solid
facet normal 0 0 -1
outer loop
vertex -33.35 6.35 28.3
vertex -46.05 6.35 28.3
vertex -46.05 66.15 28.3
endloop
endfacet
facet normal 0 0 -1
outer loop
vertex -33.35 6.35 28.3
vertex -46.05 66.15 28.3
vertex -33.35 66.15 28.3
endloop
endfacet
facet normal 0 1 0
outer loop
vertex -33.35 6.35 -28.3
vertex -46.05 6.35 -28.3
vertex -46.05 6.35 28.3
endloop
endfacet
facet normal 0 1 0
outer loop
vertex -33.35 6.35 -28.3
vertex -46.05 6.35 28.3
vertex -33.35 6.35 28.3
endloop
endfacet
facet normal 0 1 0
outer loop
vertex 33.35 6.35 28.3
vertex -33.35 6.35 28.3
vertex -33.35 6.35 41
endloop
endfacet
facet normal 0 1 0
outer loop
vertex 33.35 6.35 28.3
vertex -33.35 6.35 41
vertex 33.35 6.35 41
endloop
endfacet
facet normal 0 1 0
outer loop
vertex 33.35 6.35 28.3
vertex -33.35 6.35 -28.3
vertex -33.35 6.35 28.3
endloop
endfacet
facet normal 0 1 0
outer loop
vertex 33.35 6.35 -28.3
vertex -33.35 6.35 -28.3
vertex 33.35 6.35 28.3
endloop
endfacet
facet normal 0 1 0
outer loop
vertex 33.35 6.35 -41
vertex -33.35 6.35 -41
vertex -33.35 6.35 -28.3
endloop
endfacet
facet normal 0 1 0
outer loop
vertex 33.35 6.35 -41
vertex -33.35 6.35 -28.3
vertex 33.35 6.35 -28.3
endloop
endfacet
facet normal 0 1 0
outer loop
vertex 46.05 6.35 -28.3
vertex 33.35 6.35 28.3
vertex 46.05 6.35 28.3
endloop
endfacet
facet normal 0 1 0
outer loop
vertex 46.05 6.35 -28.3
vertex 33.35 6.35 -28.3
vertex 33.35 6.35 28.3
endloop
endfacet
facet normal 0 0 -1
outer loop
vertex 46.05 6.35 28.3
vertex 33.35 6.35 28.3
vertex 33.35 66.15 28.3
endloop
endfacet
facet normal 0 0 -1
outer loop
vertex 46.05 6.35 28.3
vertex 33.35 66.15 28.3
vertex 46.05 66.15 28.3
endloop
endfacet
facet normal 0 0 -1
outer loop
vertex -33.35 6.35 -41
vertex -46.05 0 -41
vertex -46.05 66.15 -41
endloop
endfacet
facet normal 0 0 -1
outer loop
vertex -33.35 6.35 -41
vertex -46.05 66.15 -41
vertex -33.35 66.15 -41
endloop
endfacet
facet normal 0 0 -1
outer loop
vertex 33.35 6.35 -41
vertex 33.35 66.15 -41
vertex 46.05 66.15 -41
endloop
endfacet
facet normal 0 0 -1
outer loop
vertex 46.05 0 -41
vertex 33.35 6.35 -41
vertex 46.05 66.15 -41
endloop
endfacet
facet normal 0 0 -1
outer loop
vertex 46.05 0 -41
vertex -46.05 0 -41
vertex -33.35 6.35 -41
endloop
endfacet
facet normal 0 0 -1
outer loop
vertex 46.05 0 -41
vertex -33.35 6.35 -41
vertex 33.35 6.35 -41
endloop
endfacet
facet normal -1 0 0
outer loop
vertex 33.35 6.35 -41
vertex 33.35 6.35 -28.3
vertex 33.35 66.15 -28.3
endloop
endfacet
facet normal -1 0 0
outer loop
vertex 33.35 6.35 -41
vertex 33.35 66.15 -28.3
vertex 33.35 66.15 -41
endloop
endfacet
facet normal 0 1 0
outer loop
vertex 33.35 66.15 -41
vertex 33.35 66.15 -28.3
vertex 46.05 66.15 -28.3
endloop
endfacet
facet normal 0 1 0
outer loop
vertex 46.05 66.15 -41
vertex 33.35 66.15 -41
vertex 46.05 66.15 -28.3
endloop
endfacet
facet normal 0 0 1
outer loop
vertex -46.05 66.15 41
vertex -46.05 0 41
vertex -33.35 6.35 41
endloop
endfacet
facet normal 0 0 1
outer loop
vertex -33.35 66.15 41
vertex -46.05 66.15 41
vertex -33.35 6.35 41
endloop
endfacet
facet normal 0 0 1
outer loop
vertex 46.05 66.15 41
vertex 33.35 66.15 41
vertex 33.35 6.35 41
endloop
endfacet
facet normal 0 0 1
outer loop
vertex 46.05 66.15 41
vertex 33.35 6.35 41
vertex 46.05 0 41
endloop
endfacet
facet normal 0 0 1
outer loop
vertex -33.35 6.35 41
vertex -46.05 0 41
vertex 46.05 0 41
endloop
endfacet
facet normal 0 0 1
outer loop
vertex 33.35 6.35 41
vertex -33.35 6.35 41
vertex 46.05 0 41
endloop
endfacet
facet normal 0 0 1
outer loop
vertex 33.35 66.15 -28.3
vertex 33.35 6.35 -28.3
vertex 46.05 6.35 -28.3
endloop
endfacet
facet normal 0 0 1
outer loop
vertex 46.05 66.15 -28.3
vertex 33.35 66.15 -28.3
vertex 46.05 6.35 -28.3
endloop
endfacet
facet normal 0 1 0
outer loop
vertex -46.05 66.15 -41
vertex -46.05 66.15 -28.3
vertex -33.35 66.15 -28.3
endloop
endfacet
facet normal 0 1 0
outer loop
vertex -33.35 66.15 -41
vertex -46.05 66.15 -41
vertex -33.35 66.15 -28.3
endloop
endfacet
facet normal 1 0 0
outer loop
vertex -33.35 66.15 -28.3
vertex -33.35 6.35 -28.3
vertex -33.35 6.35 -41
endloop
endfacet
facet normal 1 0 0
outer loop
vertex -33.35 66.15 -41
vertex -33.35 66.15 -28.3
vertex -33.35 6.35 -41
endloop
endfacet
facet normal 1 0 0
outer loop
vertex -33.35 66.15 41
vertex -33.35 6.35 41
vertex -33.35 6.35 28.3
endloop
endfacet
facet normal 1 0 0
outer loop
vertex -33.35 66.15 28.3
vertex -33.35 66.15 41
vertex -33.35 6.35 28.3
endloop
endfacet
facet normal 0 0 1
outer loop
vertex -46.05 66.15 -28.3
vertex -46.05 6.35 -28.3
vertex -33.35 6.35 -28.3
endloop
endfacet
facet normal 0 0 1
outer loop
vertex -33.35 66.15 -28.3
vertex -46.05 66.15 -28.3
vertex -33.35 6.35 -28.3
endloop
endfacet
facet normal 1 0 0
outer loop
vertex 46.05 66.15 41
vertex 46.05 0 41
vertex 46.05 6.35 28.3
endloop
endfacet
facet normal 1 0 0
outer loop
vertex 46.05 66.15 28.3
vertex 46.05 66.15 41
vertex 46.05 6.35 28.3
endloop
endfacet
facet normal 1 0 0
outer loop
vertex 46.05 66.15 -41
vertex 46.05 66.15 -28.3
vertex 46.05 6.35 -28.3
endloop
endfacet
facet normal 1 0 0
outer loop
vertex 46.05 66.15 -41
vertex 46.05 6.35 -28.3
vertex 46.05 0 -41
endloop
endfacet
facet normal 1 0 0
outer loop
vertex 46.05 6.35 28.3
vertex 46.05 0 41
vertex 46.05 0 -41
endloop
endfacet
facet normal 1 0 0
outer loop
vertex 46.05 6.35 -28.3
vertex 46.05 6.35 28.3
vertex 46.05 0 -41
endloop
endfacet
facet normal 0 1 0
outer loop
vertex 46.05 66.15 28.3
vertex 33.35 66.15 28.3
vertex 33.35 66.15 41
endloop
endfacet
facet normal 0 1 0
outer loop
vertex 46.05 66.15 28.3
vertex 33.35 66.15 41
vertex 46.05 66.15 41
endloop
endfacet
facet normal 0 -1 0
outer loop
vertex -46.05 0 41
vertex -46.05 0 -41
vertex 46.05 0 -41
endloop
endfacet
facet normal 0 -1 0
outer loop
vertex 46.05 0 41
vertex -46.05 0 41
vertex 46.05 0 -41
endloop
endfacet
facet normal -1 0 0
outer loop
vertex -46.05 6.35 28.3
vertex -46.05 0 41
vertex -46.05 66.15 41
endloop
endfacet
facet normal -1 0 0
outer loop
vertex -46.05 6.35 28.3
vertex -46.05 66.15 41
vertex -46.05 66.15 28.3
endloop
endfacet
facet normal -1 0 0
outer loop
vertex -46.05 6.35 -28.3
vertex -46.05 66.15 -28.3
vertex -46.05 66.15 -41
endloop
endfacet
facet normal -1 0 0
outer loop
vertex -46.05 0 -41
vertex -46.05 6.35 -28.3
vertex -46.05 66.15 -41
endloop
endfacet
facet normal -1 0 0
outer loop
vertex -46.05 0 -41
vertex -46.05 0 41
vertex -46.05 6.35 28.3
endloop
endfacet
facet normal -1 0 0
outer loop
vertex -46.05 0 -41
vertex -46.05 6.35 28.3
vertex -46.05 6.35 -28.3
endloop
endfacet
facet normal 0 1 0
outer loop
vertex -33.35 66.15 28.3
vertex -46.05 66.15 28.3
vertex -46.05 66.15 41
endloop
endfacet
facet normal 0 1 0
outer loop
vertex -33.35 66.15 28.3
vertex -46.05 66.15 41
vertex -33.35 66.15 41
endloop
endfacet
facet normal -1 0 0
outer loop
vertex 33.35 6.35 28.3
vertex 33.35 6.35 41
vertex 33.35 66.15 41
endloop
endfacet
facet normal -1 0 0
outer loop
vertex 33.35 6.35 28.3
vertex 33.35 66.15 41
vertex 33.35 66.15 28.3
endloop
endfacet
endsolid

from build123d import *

# Parameters (mm, degrees)
SKETCH1_W           = 92.09999995
SKETCH1_H           = 82
BOSS_EXTRUDE3_DEPTH = 6.35
SKETCH2_W           = 12.7
SKETCH2_H           = 12.7
BOSS_EXTRUDE4_DEPTH = 59.8


with BuildPart() as part:
    # Sketch1 → Boss-Extrude3 (new body)
    with BuildSketch(Plane(origin=(0, 0, 0), x_dir=(1, 0, 0), z_dir=(0, 1, 0))):
        Rectangle(SKETCH1_W, SKETCH1_H)
    extrude(amount=BOSS_EXTRUDE3_DEPTH)

    # Sketch2 → Boss-Extrude4 (add)
    with BuildSketch(Plane(origin=(0, 6.35, 0), x_dir=(1, 0, 0), z_dir=(0, 1, 0))):
        with Locations((-39.699999975, 34.65)):
            Rectangle(SKETCH2_W, SKETCH2_H)
        with Locations((39.699999975, 34.65)):
            Rectangle(SKETCH2_W, SKETCH2_H)
        with Locations((39.699999975, -34.65)):
            Rectangle(SKETCH2_W, SKETCH2_H)
        with Locations((-39.699999975, -34.65)):
            Rectangle(SKETCH2_W, SKETCH2_H)
    extrude(amount=BOSS_EXTRUDE4_DEPTH)


solid = part.part
